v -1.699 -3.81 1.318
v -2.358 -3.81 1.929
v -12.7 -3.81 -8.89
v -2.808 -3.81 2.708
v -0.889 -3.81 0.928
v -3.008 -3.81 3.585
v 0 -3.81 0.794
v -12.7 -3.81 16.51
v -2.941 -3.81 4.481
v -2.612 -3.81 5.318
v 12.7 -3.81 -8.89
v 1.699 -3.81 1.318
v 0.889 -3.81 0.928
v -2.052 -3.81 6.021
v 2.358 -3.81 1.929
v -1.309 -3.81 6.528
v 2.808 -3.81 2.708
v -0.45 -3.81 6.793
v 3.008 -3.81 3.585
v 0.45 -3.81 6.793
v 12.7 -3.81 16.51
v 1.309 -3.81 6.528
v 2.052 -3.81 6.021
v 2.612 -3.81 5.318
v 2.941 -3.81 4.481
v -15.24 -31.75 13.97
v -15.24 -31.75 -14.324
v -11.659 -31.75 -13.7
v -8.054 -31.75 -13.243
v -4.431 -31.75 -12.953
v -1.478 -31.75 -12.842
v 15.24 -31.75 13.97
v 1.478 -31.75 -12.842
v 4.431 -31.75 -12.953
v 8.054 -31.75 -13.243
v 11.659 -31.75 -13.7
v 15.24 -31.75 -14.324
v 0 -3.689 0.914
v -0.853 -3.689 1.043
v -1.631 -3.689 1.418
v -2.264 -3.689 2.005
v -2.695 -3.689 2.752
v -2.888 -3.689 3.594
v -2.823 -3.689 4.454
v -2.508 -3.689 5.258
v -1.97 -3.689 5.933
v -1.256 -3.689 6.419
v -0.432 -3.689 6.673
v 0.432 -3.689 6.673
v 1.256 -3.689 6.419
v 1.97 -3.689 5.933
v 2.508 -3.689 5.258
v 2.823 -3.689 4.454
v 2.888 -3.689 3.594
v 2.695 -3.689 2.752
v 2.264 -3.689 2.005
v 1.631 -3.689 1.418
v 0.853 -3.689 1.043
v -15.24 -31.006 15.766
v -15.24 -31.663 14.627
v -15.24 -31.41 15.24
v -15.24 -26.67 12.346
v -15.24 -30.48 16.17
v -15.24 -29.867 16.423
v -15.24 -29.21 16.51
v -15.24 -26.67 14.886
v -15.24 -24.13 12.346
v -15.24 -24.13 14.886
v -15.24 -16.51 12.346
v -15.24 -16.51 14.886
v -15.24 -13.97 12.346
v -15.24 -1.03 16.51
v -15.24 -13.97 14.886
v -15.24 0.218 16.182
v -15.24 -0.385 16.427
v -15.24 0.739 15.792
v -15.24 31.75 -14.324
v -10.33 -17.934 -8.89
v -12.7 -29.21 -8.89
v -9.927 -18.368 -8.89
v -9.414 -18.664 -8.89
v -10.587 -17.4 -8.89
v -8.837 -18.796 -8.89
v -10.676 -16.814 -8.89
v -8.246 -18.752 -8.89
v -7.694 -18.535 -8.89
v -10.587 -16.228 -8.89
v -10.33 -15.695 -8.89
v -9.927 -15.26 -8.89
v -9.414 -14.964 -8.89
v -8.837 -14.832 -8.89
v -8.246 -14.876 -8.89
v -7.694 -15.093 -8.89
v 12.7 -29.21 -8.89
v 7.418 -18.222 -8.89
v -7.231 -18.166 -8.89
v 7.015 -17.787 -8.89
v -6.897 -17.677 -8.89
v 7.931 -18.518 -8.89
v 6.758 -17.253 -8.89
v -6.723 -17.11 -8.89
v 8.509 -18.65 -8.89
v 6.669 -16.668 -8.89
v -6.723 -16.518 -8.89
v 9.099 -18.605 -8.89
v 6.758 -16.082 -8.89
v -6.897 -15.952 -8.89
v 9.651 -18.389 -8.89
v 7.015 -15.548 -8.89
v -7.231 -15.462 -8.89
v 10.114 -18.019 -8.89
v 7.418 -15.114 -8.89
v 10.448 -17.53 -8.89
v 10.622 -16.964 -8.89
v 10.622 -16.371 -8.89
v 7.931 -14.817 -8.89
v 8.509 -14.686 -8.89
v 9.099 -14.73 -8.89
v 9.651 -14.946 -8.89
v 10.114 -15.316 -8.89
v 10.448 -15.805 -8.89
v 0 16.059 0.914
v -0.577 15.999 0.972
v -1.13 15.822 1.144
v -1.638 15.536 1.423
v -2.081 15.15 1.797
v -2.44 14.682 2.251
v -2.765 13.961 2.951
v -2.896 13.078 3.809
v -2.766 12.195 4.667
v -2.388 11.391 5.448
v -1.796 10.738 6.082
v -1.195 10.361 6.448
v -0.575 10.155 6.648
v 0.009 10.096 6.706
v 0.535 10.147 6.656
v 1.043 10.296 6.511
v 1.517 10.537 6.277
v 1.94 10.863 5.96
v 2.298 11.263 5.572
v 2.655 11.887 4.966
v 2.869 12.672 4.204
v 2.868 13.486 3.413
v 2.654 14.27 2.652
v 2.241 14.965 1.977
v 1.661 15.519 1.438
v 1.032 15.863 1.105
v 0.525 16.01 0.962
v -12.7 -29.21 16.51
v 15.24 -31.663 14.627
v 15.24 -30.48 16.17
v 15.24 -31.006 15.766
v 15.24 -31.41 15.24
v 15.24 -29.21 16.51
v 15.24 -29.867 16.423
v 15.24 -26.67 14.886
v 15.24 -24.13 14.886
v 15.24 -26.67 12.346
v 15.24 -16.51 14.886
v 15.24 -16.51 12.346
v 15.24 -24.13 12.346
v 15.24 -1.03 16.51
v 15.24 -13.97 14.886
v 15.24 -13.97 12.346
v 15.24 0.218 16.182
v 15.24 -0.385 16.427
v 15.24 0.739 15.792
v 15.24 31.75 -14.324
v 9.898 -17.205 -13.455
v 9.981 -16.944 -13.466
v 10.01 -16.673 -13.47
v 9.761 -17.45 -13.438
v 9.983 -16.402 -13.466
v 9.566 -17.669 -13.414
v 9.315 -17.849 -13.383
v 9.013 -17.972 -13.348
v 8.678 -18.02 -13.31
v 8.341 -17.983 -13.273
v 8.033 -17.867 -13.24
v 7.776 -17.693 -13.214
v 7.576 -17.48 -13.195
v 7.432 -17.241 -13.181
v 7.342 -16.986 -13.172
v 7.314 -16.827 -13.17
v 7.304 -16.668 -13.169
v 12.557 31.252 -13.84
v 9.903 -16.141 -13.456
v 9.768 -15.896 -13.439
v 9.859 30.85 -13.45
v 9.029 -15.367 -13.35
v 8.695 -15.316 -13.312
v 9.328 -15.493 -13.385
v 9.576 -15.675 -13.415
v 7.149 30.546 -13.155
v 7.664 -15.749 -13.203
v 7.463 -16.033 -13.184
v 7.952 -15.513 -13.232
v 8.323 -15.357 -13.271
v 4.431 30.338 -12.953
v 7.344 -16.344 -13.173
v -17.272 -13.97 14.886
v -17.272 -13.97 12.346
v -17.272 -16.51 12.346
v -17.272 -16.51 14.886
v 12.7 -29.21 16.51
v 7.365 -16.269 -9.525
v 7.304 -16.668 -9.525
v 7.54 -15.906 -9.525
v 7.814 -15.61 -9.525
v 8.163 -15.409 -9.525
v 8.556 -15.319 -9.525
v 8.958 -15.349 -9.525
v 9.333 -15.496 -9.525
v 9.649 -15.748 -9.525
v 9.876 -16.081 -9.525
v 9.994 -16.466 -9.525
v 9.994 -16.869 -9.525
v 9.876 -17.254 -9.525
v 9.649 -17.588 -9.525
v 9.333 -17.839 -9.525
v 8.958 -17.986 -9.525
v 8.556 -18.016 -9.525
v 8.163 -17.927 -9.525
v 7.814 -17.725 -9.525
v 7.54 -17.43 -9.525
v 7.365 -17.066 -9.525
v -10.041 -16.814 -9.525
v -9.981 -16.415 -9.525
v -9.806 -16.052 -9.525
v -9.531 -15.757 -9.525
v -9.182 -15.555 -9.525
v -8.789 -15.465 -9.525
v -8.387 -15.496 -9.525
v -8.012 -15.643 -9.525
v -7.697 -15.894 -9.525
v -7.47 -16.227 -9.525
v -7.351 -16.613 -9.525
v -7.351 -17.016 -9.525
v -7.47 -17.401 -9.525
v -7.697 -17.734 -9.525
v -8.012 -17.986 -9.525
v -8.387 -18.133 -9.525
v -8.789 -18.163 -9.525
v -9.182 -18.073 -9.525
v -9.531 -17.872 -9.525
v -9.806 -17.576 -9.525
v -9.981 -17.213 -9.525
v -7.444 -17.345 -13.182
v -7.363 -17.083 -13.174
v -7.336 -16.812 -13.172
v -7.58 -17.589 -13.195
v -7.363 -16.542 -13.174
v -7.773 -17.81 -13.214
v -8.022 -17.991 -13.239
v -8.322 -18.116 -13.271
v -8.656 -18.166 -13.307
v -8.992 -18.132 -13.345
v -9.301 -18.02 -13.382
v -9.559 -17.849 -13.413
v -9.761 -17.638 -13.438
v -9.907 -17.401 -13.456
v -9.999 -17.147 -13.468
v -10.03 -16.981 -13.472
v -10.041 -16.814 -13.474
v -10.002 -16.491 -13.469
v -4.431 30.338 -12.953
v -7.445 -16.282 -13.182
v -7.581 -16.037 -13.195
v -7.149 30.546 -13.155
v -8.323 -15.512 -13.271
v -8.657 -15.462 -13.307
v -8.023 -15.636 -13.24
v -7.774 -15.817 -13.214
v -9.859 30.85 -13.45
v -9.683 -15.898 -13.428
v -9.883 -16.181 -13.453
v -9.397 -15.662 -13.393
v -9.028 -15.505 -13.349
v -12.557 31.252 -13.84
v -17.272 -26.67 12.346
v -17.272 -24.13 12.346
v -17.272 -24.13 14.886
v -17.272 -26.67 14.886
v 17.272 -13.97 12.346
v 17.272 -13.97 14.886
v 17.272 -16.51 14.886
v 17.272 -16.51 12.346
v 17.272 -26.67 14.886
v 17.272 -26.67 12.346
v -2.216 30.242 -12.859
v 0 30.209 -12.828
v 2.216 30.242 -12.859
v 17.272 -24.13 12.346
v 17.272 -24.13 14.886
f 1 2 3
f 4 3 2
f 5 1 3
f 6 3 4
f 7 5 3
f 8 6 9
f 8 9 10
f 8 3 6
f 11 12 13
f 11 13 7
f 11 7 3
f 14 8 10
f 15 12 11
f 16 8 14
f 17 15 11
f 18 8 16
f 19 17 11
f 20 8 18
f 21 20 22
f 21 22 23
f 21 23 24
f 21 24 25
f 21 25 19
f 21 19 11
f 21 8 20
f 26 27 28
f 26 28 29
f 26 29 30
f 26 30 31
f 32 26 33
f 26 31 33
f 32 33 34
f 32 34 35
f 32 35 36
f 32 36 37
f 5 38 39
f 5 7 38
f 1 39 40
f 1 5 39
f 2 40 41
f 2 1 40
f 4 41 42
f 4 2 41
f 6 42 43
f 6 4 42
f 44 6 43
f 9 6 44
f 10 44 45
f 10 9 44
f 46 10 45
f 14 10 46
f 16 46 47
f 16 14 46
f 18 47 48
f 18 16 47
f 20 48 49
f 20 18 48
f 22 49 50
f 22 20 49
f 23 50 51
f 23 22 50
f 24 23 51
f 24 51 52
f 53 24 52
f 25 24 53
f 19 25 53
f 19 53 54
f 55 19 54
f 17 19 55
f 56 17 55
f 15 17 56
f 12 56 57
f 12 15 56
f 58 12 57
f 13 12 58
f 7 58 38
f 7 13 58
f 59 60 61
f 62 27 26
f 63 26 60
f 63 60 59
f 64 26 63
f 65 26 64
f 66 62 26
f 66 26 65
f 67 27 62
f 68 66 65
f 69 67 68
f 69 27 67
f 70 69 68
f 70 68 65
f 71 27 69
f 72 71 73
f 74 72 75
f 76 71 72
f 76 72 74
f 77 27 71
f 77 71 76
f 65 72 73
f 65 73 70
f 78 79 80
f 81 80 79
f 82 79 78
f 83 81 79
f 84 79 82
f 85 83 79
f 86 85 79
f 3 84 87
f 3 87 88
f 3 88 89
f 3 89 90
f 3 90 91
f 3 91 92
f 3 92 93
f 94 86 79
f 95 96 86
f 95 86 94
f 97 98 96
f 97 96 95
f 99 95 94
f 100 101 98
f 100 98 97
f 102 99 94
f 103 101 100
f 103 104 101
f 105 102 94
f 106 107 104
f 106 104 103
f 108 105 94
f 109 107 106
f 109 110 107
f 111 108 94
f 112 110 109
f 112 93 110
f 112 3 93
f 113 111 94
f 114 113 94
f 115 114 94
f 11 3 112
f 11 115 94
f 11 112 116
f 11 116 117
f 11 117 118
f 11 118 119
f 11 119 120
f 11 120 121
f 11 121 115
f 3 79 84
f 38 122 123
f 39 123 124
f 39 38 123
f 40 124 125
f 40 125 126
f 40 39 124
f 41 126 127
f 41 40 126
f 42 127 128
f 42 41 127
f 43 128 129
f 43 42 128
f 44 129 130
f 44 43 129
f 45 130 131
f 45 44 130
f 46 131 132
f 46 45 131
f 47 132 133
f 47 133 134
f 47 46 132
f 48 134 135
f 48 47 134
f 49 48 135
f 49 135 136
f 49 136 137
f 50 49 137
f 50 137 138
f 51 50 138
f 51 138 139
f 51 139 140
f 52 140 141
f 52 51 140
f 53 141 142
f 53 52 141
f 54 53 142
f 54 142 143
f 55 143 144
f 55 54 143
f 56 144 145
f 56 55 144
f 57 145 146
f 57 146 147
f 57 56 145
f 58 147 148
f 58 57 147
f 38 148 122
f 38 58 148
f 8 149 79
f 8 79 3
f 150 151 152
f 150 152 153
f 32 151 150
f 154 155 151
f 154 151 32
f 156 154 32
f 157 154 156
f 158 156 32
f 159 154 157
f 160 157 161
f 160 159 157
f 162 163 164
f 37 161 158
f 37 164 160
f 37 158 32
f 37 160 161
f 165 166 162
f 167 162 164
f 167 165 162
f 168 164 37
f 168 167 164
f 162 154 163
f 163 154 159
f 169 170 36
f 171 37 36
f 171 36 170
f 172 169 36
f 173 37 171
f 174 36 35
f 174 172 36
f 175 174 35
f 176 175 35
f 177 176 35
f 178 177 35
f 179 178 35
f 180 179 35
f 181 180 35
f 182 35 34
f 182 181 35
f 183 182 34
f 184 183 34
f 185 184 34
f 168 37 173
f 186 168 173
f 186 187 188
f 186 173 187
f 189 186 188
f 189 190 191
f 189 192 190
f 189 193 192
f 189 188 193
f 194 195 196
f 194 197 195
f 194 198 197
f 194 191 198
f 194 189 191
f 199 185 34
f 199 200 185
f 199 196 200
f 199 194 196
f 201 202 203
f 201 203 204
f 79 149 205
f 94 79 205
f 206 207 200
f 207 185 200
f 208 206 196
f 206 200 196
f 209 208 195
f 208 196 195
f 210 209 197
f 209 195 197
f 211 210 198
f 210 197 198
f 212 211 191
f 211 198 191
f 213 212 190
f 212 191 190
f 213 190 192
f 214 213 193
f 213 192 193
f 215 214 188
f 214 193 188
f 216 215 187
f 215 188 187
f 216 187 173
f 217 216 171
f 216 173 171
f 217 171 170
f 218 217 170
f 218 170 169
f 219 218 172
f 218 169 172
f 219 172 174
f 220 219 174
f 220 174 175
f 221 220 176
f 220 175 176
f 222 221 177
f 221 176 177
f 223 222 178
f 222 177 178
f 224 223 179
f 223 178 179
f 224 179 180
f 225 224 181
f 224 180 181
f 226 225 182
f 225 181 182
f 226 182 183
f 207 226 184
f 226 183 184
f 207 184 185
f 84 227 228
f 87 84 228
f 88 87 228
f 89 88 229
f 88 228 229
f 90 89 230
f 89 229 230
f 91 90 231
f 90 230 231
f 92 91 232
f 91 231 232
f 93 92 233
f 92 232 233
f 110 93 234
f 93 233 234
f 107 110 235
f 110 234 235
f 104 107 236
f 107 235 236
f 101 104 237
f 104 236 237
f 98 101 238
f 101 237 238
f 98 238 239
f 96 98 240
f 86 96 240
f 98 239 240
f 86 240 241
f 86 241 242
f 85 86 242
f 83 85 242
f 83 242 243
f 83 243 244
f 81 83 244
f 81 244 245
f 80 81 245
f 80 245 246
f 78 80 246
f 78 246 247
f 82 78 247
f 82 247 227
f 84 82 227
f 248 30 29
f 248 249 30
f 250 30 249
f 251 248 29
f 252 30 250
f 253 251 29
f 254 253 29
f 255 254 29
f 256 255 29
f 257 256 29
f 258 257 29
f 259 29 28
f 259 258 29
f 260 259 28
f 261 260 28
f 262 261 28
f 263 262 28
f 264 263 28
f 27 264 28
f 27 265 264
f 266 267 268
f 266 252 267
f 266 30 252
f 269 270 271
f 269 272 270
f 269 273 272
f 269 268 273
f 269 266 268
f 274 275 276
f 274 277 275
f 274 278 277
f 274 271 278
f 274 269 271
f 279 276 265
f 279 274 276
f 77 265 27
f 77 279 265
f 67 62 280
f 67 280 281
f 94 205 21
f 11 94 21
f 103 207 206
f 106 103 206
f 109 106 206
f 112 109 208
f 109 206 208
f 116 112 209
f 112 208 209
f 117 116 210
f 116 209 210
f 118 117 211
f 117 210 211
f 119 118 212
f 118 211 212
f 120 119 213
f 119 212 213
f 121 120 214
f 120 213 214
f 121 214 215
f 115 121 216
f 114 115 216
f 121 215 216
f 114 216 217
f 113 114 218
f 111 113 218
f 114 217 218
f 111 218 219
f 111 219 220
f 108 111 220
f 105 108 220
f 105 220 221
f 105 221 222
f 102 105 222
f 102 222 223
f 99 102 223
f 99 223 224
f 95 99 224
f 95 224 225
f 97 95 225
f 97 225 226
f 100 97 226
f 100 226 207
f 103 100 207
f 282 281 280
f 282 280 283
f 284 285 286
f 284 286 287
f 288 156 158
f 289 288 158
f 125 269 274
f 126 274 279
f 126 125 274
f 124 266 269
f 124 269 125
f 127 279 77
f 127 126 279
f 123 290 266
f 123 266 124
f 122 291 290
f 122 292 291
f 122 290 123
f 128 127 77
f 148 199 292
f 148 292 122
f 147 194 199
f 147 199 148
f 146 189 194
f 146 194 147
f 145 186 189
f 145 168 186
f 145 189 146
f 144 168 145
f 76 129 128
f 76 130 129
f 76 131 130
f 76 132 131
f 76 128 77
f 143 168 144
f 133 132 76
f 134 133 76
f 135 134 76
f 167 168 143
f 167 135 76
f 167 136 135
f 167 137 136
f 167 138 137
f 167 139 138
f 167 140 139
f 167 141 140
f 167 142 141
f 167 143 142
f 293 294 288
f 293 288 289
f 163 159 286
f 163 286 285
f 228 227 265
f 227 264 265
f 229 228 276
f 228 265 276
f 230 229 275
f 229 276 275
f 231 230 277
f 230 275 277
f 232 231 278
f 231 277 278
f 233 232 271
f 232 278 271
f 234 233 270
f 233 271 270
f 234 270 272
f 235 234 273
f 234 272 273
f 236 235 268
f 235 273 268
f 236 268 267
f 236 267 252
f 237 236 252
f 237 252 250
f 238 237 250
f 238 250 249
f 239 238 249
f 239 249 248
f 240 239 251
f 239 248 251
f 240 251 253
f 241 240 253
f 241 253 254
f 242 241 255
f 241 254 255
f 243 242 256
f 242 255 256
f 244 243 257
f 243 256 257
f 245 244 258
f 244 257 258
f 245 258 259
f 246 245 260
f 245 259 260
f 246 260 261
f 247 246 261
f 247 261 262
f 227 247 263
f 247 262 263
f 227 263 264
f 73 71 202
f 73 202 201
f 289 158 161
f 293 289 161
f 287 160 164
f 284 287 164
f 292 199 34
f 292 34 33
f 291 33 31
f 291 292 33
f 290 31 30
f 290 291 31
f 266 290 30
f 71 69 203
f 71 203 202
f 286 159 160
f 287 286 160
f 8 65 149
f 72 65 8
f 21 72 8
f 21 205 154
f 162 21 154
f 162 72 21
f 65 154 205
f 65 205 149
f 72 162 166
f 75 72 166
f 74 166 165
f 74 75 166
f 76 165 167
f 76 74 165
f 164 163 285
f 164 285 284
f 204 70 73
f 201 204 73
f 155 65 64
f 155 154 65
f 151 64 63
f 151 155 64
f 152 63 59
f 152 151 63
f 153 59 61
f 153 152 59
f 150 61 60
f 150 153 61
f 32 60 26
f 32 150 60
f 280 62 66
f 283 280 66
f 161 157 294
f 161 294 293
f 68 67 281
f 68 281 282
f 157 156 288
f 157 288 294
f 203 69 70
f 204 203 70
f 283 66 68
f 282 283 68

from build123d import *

# Parameters (mm, degrees)
BOSS_EXTRUDE1_DEPTH                 = 31.75
SKETCH3_W                           = 25.4
SKETCH3_H                           = 25.4
CUT_EXTRUDE1_DEPTH                  = 25.4
CUT_EXTRUDE2_DEPTH                  = 30.48
SKETCH5_W                           = 2.54
SKETCH5_H                           = 2.54
BOSS_EXTRUDE2_DEPTH                 = 2.032
SKETCH7_W                           = 2.54
SKETCH7_H                           = 2.54
BOSS_EXTRUDE3_DEPTH                 = 2.032
FILLET1_R                           = 2.54
FILLET2_R                           = 2.54
TAP_DRILL_FOR_6_32_TAP1_D           = 2.7051
TAP_DRILL_FOR_6_32_TAP1_CSINK_D     = 3.9751
TAP_DRILL_FOR_6_32_TAP1_CSINK_ANGLE = 90
TAP_DRILL_FOR_6_32_TAP2_D           = 2.7051
TAP_DRILL_FOR_6_32_TAP2_CSINK_D     = 3.9751
TAP_DRILL_FOR_6_32_TAP2_CSINK_ANGLE = 90


with BuildPart() as part:
    # Sketch1 → Boss-Extrude1 (new, symmetric)
    with BuildSketch(Plane(origin=(0, 0, 0), x_dir=(1, 0, 0), z_dir=(0, 1, 0))):
        with BuildLine():
            Line((-4.43094419, 12.953042159), (-15.24, 12.953042159))
            Line((-15.24, 12.953042159), (-15.24, -16.51))
            Line((-15.24, -16.51), (15.24, -16.51))
            Line((15.24, -16.51), (15.24, 12.953042159))
            Line((15.24, 12.953042159), (4.43094419, 12.953042159))
            ThreePointArc((4.43094419, 12.953042159), (0, 12.82766418), (-4.43094419, 12.953042159))
        make_face()
        with BuildLine():
            Line((-15.24, 14.323960084), (-15.24, 12.953042159))
            Line((-15.24, 12.953042159), (-4.43094419, 12.953042159))
            ThreePointArc((-4.43094419, 12.953042159), (-9.859328847, 13.450401628), (-15.24, 14.323960084))
        make_face()
        with BuildLine():
            ThreePointArc((15.24, 14.323960084), (9.859328847, 13.450401628), (4.43094419, 12.953042159))
            Line((4.43094419, 12.953042159), (15.24, 12.953042159))
            Line((15.24, 12.953042159), (15.24, 14.323960084))
        make_face()
    extrude(amount=BOSS_EXTRUDE1_DEPTH, both=True)

    # Sketch3 → Cut-Extrude1 (cut)
    with BuildSketch(Plane.XY.offset(16.51)):
        with Locations((0, -16.51)):
            Rectangle(SKETCH3_W, SKETCH3_H)
    extrude(amount=-CUT_EXTRUDE1_DEPTH, mode=Mode.SUBTRACT)

    # Sketch4 → Cut-Extrude2 (cut)
    with BuildSketch(Plane(origin=(15.24, 0, 0), x_dir=(0, 0, -1), z_dir=(1, 0, 0))):
        Polygon((-16.51, 31.75), (14.323960084, 31.75), (-16.51, 0), align=None)
    extrude(amount=-CUT_EXTRUDE2_DEPTH, mode=Mode.SUBTRACT)

    # Sketch5 → Boss-Extrude2 (add)
    with BuildSketch(Plane(origin=(15.24, 0, 0), x_dir=(0, 0, -1), z_dir=(1, 0, 0))):
        with Locations((-13.616039916, -25.4)):
            Rectangle(SKETCH5_W, SKETCH5_H)
        with Locations((-13.616039916, -15.24)):
            Rectangle(SKETCH5_W, SKETCH5_H)
    extrude(amount=BOSS_EXTRUDE2_DEPTH)

    # Sketch7 → Boss-Extrude3 (add)
    with BuildSketch(Plane.ZY.offset(15.24)):
        with Locations((13.616039916, -25.4)):
            Rectangle(SKETCH7_W, SKETCH7_H)
        with Locations((13.616039916, -15.24)):
            Rectangle(SKETCH7_W, SKETCH7_H)
    extrude(amount=BOSS_EXTRUDE3_DEPTH)

    # Sketch21 → #1 (0.228) Diameter Hole3 (revolve, cut)
    with BuildSketch(Plane(origin=(0, -3.81, 3.81), x_dir=(0, 0, -1), z_dir=(1, 0, 0))):
        Polygon((0, 0), (0, 35.56), (2.8956, 35.56), (2.8956, 0.12065), (3.01625, 0), align=None)
    revolve(axis=Axis((0, -10.16, 3.81), (0, 1, 0)), mode=Mode.SUBTRACT)

    # Fillet1
    fillet1_edges = [part.edges().sort_by_distance(p)[0] for p in [
        (0, 0, 16.51),
    ]]
    fillet(fillet1_edges, radius=FILLET1_R)

    # Fillet2
    fillet2_edges = [part.edges().sort_by_distance(p)[0] for p in [
        (0, -31.75, 16.51),
    ]]
    fillet(fillet2_edges, radius=FILLET2_R - 0.0001)  # a hair under: the kernel refuses the full size

    # Tap Drill for #6-32 Tap1 (through all)
    with Locations(Plane.XY.offset(-8.89)):
        with Locations((-8.688147052, -16.814161917)):
            CounterSinkHole(TAP_DRILL_FOR_6_32_TAP1_D / 2, TAP_DRILL_FOR_6_32_TAP1_CSINK_D / 2, counter_sink_angle=TAP_DRILL_FOR_6_32_TAP1_CSINK_ANGLE)

    # Tap Drill for #6-32 Tap2 (through all)
    with Locations(Plane.XY.offset(-8.89)):
        with Locations((8.657032922, -16.667582931)):
            CounterSinkHole(TAP_DRILL_FOR_6_32_TAP2_D / 2, TAP_DRILL_FOR_6_32_TAP2_CSINK_D / 2, counter_sink_angle=TAP_DRILL_FOR_6_32_TAP2_CSINK_ANGLE)


solid = part.part
